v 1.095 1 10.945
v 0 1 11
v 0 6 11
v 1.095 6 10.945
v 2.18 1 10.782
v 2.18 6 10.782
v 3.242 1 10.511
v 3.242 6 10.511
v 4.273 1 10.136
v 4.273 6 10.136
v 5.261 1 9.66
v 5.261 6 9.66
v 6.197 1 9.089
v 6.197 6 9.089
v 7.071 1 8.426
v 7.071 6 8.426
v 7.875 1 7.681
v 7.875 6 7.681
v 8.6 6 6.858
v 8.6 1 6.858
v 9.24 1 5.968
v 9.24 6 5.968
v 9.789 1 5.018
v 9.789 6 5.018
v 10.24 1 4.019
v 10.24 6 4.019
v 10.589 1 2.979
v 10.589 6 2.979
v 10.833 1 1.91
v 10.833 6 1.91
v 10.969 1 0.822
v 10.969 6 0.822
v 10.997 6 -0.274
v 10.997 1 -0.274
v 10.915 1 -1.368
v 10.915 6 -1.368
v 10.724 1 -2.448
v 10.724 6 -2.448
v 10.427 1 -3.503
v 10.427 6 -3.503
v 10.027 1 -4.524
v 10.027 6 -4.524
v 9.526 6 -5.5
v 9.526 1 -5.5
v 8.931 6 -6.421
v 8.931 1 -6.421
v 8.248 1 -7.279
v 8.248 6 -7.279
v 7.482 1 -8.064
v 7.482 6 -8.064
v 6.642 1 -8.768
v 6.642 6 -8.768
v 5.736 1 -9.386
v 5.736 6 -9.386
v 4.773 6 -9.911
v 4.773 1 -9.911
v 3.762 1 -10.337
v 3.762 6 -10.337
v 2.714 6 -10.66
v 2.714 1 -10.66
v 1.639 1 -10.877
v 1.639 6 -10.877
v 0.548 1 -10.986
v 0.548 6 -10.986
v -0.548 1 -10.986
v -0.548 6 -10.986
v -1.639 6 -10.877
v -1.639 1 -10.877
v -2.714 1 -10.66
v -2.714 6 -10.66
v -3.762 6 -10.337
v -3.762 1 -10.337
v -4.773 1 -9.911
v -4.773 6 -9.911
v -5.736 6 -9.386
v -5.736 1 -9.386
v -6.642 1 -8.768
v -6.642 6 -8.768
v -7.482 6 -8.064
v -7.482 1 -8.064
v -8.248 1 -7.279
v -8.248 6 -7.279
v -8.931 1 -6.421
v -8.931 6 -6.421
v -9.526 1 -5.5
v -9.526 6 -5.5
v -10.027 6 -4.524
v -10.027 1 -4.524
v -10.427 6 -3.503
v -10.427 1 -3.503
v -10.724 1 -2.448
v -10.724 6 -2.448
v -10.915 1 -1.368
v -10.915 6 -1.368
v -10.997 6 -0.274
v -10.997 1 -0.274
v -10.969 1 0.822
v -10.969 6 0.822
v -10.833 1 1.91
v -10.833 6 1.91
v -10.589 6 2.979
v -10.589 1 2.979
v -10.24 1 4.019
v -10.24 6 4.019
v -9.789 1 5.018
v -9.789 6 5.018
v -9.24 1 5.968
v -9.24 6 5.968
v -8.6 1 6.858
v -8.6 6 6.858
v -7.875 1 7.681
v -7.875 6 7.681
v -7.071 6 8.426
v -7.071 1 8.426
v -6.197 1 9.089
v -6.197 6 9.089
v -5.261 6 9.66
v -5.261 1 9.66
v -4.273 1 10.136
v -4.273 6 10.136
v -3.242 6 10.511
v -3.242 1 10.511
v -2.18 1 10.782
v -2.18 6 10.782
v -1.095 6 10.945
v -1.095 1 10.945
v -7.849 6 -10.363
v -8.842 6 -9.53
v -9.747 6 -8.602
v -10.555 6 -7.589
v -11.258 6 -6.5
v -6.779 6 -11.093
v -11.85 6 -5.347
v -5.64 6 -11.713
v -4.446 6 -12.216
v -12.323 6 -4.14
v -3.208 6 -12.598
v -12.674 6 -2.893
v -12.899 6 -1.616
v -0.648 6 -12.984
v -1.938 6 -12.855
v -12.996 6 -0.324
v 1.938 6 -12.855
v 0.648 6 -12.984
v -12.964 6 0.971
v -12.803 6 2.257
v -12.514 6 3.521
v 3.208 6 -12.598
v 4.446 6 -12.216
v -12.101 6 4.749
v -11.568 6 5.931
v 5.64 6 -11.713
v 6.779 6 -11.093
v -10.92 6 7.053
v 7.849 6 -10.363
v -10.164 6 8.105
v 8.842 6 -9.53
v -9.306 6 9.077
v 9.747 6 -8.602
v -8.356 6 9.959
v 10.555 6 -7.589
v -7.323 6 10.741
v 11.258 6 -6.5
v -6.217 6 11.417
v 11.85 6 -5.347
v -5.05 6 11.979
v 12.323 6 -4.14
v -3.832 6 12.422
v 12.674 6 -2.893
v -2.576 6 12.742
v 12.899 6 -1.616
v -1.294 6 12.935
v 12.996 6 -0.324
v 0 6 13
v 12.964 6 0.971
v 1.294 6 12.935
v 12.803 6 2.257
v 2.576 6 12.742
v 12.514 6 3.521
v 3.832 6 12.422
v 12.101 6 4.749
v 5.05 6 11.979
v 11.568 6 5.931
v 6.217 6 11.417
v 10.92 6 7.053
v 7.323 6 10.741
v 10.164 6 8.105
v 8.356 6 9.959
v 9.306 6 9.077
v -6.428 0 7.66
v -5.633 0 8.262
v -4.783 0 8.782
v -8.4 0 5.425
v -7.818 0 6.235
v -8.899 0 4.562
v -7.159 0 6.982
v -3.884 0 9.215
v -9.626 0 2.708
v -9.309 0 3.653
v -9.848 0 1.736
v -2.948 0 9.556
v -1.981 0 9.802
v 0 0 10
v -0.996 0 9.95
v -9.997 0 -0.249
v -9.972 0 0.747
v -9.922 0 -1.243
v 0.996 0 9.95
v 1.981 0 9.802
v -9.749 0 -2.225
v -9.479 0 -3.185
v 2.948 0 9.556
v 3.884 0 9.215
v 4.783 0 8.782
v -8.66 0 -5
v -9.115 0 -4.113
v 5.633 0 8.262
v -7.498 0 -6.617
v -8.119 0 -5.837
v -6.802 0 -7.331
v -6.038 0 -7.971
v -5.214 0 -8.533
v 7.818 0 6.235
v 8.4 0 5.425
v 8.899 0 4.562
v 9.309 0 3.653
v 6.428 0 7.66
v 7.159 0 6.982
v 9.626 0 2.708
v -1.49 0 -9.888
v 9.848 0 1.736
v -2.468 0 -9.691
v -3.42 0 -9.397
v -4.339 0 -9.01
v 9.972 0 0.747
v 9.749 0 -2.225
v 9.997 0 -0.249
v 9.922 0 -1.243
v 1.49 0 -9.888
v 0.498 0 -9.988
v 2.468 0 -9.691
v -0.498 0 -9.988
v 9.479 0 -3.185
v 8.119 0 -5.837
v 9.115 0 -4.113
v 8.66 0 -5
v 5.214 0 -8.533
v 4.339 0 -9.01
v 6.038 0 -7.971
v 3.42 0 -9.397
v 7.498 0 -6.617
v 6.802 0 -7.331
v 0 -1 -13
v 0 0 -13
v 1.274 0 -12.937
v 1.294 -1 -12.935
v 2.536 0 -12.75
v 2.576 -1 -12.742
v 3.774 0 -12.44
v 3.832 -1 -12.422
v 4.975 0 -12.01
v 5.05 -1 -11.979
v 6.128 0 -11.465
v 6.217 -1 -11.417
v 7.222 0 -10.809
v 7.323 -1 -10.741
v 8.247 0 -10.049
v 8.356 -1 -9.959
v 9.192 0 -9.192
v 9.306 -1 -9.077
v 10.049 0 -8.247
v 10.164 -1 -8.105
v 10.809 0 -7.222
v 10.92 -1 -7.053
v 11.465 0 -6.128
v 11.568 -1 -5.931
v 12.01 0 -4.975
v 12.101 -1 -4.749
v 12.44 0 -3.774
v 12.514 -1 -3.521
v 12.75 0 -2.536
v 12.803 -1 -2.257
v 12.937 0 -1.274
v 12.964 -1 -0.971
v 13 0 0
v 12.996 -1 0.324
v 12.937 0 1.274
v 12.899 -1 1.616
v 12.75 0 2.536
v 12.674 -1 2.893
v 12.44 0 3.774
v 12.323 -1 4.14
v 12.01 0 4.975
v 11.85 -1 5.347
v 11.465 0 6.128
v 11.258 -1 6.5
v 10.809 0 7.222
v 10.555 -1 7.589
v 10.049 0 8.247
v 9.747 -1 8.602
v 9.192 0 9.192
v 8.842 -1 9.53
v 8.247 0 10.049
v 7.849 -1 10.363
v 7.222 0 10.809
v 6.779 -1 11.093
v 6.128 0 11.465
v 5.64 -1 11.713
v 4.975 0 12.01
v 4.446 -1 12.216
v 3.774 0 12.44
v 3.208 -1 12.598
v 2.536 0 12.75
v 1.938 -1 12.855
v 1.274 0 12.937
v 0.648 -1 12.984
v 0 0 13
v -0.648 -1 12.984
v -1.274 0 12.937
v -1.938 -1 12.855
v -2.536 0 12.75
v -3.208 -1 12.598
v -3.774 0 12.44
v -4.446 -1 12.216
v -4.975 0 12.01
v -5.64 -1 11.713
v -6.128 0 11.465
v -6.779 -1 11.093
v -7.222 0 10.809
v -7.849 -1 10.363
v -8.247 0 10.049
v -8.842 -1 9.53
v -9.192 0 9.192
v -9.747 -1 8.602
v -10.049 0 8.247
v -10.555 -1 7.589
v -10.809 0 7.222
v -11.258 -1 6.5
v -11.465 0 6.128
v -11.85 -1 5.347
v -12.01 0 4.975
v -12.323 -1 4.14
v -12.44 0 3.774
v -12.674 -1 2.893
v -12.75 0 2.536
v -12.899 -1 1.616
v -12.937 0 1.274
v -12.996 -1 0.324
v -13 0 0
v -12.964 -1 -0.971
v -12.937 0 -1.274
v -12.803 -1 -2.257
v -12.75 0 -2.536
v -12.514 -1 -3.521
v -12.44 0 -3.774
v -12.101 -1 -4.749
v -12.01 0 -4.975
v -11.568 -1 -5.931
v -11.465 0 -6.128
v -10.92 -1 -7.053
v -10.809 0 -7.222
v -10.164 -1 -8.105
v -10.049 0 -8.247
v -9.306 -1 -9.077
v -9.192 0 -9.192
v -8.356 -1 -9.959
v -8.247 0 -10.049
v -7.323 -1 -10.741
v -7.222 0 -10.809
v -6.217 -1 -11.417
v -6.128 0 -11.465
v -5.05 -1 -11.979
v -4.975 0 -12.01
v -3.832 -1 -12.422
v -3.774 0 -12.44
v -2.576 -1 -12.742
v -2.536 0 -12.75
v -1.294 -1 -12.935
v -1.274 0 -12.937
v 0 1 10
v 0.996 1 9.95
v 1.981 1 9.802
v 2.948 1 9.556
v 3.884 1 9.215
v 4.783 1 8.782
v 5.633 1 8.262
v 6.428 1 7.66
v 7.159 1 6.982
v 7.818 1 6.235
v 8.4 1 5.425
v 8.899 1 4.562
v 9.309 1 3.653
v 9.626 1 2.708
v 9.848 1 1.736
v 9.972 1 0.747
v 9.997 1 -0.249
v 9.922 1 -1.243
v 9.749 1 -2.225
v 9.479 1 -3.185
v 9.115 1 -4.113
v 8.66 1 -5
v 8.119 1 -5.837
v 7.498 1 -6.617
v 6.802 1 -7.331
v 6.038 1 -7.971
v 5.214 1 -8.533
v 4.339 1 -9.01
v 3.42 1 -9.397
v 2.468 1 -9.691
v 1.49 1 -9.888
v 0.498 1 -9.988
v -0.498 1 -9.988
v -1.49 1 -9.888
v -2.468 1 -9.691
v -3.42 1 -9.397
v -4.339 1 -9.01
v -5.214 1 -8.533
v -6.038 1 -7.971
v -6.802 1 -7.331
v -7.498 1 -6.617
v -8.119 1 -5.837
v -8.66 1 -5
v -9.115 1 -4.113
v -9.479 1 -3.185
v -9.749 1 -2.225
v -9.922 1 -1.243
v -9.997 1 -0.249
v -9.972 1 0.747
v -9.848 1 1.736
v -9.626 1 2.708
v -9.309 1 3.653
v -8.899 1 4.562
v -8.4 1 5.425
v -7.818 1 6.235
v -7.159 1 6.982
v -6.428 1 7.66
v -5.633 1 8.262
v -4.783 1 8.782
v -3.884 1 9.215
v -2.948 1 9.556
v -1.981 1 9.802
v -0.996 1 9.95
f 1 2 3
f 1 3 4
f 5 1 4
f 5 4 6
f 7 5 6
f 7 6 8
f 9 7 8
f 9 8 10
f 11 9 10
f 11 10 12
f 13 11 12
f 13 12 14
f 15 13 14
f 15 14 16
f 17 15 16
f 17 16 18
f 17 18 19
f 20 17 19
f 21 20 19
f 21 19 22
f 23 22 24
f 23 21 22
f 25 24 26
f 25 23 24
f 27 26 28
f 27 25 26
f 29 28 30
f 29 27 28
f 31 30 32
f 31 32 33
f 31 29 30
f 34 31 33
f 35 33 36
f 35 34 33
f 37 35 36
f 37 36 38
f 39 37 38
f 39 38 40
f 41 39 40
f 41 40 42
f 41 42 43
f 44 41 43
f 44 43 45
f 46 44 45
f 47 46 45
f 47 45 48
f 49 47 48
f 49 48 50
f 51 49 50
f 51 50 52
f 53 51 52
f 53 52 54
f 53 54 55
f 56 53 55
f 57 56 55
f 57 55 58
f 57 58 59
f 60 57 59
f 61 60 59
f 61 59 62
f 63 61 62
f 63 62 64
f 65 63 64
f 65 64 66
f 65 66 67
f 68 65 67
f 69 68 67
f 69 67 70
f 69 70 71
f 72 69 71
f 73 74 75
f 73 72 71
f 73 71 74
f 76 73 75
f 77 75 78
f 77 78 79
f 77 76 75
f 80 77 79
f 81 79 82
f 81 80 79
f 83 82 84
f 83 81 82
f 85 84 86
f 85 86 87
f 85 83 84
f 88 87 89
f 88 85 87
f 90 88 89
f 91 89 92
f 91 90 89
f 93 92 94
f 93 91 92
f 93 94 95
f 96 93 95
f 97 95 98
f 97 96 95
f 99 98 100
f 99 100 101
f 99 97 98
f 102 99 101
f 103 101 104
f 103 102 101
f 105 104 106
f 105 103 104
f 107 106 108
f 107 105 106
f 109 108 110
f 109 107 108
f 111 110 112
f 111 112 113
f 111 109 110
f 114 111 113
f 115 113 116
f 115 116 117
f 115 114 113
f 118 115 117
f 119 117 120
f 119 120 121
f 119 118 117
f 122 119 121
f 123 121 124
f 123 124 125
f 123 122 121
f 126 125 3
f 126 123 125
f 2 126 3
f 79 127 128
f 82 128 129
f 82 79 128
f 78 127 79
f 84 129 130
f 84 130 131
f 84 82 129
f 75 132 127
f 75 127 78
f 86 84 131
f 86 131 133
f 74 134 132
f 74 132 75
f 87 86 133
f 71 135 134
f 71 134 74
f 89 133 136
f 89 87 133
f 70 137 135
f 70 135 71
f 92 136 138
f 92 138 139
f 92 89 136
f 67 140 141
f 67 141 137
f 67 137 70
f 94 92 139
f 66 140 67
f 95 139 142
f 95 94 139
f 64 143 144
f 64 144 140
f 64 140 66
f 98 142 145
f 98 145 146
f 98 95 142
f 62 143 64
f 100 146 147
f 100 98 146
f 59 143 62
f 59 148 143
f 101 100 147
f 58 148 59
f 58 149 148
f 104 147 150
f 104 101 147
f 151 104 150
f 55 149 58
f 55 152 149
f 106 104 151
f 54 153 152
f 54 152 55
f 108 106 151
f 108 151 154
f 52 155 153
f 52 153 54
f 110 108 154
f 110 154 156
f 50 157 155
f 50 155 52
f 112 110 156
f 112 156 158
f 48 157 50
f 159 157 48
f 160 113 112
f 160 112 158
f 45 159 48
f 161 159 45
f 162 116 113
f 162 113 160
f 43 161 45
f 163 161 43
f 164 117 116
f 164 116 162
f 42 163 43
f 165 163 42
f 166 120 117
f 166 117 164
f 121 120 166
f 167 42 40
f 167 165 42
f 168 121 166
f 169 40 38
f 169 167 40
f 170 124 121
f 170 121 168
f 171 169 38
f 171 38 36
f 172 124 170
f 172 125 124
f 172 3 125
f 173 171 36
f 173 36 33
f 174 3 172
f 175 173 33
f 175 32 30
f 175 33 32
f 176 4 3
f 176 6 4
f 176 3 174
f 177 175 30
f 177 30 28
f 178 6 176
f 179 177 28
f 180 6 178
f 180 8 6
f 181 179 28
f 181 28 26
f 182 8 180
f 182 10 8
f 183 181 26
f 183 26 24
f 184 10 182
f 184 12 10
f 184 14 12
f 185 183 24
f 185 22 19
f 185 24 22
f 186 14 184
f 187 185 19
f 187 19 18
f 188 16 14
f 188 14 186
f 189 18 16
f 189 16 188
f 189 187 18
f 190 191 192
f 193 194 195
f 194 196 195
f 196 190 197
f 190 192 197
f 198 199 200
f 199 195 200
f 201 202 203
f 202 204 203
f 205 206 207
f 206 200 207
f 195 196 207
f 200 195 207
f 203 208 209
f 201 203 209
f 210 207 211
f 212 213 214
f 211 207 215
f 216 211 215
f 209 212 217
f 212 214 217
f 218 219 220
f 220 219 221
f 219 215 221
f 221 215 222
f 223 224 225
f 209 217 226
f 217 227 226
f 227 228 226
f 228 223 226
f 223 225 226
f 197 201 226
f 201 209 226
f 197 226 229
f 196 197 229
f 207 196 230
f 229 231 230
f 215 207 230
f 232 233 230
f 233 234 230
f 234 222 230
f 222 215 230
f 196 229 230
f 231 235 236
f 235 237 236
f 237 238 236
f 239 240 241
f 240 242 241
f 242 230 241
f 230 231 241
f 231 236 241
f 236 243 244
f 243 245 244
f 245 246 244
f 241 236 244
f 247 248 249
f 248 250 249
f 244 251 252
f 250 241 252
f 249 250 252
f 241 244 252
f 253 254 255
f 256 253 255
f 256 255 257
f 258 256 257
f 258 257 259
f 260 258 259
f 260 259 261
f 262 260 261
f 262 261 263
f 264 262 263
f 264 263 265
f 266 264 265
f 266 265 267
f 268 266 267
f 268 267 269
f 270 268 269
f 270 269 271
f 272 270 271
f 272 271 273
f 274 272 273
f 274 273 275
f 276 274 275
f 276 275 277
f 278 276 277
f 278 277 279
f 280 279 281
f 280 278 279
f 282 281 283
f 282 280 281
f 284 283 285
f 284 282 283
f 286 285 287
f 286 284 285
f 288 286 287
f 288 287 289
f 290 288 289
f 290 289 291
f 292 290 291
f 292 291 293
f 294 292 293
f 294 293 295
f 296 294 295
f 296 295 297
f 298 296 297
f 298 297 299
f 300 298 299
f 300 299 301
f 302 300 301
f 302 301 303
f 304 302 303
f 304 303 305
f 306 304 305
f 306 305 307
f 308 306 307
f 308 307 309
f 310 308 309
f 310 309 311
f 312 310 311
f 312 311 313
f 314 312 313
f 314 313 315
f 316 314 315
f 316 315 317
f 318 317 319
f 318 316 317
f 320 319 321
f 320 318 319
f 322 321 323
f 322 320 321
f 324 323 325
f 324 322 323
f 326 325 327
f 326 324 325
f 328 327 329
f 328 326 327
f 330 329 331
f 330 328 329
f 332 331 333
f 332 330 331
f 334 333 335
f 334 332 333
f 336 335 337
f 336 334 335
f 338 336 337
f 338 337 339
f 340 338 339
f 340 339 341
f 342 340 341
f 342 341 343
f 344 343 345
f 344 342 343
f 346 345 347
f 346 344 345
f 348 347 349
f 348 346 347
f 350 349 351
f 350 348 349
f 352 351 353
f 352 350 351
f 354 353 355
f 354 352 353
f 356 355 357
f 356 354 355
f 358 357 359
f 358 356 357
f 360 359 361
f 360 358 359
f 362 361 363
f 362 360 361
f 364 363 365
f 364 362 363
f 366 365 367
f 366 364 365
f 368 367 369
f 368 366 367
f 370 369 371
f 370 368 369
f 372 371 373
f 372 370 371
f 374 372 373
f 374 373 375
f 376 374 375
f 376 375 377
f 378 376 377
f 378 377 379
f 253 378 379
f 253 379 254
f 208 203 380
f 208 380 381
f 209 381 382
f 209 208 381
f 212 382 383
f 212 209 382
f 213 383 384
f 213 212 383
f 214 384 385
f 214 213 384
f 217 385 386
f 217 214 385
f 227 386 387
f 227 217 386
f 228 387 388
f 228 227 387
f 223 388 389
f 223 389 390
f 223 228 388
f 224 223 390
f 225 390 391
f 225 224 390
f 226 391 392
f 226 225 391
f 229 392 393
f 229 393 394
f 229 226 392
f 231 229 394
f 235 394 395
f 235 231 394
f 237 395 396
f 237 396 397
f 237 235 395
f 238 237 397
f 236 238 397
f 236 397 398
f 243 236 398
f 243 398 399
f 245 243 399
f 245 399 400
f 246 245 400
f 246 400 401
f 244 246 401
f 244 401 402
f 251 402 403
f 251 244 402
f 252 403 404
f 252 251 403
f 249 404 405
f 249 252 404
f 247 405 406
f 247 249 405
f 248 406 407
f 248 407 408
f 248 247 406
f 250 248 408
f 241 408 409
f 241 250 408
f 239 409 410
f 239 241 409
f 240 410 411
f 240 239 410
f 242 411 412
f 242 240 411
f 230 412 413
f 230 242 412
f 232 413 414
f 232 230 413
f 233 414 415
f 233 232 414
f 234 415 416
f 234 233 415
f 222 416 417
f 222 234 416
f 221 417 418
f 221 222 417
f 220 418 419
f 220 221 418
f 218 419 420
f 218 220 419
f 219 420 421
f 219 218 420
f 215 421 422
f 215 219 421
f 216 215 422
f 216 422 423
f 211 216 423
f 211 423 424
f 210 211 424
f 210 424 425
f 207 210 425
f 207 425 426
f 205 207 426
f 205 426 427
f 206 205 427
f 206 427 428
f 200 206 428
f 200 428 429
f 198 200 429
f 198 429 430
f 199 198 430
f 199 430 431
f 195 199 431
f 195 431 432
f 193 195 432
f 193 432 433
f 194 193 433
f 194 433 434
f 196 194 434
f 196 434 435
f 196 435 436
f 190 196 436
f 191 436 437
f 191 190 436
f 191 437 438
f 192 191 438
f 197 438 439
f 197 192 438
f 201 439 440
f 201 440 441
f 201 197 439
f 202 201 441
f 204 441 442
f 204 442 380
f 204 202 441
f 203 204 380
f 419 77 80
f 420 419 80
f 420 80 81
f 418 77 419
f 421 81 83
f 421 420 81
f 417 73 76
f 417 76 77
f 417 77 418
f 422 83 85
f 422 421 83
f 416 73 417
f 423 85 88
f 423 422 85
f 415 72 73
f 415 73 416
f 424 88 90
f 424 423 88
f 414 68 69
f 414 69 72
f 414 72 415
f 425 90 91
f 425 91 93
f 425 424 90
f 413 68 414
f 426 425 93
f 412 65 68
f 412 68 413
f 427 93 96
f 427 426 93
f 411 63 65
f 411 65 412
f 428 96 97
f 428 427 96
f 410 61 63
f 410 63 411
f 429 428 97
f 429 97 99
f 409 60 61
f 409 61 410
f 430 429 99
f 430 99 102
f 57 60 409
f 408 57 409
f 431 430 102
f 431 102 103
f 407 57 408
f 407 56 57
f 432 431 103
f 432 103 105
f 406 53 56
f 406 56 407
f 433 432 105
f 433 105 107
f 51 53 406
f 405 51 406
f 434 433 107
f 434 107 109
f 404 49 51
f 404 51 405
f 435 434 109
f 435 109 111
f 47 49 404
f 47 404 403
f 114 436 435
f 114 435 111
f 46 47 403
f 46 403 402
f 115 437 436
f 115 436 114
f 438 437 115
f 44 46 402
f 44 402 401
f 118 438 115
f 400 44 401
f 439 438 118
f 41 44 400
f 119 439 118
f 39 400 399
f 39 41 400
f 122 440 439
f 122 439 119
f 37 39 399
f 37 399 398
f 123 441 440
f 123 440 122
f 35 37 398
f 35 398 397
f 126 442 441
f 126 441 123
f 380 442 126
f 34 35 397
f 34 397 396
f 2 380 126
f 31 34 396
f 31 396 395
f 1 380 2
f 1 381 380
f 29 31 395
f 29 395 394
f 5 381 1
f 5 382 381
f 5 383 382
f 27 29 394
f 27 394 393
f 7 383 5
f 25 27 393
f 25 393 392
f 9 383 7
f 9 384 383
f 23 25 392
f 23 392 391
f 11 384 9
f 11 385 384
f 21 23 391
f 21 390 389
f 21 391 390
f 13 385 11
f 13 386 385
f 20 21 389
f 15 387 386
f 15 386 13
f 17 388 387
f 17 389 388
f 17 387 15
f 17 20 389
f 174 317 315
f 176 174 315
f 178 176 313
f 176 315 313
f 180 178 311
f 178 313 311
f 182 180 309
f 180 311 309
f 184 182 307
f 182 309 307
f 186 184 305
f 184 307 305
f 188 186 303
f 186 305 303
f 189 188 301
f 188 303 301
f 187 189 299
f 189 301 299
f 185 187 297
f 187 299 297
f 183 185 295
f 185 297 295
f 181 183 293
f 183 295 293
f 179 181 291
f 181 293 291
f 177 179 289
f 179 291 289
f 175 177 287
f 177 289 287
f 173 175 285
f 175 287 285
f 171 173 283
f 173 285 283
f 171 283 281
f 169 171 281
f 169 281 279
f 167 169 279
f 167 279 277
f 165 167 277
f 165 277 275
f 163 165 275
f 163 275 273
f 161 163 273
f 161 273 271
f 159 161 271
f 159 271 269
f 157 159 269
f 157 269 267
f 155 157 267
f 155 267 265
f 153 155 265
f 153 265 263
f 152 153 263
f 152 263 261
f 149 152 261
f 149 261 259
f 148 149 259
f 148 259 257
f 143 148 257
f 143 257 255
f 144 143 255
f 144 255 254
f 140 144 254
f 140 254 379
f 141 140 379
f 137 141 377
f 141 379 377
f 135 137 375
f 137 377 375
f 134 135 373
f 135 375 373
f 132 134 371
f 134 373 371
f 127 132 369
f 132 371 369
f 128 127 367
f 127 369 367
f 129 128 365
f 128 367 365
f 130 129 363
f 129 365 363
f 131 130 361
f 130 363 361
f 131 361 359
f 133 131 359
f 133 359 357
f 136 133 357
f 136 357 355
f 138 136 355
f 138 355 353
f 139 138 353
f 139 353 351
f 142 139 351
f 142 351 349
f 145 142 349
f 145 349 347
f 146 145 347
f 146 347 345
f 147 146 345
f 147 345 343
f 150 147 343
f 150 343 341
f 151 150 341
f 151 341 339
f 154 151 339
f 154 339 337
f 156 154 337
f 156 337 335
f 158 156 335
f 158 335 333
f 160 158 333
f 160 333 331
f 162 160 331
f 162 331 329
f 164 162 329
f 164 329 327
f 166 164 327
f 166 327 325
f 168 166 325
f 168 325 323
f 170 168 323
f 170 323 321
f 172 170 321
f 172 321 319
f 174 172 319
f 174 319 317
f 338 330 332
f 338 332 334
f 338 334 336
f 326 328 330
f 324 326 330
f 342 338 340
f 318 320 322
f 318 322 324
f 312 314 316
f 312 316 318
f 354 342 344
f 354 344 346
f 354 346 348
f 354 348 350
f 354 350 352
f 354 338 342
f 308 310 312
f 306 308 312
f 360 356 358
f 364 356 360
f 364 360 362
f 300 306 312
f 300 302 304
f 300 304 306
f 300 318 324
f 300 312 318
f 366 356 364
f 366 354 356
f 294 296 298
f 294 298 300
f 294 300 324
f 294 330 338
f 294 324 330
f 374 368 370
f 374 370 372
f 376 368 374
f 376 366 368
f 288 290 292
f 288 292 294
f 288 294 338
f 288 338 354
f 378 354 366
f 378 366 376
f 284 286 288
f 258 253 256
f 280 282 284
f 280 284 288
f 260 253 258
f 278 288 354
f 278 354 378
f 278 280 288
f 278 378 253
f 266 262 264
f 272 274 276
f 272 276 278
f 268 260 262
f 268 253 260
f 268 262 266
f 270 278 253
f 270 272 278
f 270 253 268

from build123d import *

# Parameters (mm, degrees)
ESQUISSE1_R        = 13
ESQUISSE1_R_2      = 11
BOSS_EXTRU_1_DEPTH = 6
BOSS_EXTRU_2_START = 1
ESQUISSE2_R        = 13
BOSS_EXTRU_2_DEPTH = 1
ESQUISSE3_R        = 11
ESQUISSE3_R_2      = 10
BOSS_EXTRU_3_DEPTH = 1


with BuildPart() as part:
    # Esquisse1 → Boss.-Extru.1 (new body)
    with BuildSketch(Plane(origin=(0, 0, 0), x_dir=(1, 0, 0), z_dir=(0, 1, 0))):
        with Locations(Location((0, 0, 0), (0, 0, 270))):
            Circle(ESQUISSE1_R)
        with Locations(Location((0, 0, 0), (0, 0, 270))):
            Circle(ESQUISSE1_R_2, mode=Mode.SUBTRACT)
    extrude(amount=BOSS_EXTRU_1_DEPTH)

    # Esquisse2 → Boss.-Extru.2 (add)
    with BuildSketch(Plane.XZ.offset(BOSS_EXTRU_2_START)):
        with Locations(Location((0, 0, 0), (0, 0, 270))):
            Circle(ESQUISSE2_R)
    extrude(amount=-BOSS_EXTRU_2_DEPTH)

    # Esquisse3 → Boss.-Extru.3 (add)
    with BuildSketch(Plane(origin=(0, 0, 0), x_dir=(1, 0, 0), z_dir=(0, 1, 0))):
        with Locations(Location((0, 0, 0), (0, 0, 270))):
            Circle(ESQUISSE3_R)
        with Locations(Location((0, 0, 0), (0, 0, 270))):
            Circle(ESQUISSE3_R_2, mode=Mode.SUBTRACT)
    extrude(amount=BOSS_EXTRU_3_DEPTH)


solid = part.part
